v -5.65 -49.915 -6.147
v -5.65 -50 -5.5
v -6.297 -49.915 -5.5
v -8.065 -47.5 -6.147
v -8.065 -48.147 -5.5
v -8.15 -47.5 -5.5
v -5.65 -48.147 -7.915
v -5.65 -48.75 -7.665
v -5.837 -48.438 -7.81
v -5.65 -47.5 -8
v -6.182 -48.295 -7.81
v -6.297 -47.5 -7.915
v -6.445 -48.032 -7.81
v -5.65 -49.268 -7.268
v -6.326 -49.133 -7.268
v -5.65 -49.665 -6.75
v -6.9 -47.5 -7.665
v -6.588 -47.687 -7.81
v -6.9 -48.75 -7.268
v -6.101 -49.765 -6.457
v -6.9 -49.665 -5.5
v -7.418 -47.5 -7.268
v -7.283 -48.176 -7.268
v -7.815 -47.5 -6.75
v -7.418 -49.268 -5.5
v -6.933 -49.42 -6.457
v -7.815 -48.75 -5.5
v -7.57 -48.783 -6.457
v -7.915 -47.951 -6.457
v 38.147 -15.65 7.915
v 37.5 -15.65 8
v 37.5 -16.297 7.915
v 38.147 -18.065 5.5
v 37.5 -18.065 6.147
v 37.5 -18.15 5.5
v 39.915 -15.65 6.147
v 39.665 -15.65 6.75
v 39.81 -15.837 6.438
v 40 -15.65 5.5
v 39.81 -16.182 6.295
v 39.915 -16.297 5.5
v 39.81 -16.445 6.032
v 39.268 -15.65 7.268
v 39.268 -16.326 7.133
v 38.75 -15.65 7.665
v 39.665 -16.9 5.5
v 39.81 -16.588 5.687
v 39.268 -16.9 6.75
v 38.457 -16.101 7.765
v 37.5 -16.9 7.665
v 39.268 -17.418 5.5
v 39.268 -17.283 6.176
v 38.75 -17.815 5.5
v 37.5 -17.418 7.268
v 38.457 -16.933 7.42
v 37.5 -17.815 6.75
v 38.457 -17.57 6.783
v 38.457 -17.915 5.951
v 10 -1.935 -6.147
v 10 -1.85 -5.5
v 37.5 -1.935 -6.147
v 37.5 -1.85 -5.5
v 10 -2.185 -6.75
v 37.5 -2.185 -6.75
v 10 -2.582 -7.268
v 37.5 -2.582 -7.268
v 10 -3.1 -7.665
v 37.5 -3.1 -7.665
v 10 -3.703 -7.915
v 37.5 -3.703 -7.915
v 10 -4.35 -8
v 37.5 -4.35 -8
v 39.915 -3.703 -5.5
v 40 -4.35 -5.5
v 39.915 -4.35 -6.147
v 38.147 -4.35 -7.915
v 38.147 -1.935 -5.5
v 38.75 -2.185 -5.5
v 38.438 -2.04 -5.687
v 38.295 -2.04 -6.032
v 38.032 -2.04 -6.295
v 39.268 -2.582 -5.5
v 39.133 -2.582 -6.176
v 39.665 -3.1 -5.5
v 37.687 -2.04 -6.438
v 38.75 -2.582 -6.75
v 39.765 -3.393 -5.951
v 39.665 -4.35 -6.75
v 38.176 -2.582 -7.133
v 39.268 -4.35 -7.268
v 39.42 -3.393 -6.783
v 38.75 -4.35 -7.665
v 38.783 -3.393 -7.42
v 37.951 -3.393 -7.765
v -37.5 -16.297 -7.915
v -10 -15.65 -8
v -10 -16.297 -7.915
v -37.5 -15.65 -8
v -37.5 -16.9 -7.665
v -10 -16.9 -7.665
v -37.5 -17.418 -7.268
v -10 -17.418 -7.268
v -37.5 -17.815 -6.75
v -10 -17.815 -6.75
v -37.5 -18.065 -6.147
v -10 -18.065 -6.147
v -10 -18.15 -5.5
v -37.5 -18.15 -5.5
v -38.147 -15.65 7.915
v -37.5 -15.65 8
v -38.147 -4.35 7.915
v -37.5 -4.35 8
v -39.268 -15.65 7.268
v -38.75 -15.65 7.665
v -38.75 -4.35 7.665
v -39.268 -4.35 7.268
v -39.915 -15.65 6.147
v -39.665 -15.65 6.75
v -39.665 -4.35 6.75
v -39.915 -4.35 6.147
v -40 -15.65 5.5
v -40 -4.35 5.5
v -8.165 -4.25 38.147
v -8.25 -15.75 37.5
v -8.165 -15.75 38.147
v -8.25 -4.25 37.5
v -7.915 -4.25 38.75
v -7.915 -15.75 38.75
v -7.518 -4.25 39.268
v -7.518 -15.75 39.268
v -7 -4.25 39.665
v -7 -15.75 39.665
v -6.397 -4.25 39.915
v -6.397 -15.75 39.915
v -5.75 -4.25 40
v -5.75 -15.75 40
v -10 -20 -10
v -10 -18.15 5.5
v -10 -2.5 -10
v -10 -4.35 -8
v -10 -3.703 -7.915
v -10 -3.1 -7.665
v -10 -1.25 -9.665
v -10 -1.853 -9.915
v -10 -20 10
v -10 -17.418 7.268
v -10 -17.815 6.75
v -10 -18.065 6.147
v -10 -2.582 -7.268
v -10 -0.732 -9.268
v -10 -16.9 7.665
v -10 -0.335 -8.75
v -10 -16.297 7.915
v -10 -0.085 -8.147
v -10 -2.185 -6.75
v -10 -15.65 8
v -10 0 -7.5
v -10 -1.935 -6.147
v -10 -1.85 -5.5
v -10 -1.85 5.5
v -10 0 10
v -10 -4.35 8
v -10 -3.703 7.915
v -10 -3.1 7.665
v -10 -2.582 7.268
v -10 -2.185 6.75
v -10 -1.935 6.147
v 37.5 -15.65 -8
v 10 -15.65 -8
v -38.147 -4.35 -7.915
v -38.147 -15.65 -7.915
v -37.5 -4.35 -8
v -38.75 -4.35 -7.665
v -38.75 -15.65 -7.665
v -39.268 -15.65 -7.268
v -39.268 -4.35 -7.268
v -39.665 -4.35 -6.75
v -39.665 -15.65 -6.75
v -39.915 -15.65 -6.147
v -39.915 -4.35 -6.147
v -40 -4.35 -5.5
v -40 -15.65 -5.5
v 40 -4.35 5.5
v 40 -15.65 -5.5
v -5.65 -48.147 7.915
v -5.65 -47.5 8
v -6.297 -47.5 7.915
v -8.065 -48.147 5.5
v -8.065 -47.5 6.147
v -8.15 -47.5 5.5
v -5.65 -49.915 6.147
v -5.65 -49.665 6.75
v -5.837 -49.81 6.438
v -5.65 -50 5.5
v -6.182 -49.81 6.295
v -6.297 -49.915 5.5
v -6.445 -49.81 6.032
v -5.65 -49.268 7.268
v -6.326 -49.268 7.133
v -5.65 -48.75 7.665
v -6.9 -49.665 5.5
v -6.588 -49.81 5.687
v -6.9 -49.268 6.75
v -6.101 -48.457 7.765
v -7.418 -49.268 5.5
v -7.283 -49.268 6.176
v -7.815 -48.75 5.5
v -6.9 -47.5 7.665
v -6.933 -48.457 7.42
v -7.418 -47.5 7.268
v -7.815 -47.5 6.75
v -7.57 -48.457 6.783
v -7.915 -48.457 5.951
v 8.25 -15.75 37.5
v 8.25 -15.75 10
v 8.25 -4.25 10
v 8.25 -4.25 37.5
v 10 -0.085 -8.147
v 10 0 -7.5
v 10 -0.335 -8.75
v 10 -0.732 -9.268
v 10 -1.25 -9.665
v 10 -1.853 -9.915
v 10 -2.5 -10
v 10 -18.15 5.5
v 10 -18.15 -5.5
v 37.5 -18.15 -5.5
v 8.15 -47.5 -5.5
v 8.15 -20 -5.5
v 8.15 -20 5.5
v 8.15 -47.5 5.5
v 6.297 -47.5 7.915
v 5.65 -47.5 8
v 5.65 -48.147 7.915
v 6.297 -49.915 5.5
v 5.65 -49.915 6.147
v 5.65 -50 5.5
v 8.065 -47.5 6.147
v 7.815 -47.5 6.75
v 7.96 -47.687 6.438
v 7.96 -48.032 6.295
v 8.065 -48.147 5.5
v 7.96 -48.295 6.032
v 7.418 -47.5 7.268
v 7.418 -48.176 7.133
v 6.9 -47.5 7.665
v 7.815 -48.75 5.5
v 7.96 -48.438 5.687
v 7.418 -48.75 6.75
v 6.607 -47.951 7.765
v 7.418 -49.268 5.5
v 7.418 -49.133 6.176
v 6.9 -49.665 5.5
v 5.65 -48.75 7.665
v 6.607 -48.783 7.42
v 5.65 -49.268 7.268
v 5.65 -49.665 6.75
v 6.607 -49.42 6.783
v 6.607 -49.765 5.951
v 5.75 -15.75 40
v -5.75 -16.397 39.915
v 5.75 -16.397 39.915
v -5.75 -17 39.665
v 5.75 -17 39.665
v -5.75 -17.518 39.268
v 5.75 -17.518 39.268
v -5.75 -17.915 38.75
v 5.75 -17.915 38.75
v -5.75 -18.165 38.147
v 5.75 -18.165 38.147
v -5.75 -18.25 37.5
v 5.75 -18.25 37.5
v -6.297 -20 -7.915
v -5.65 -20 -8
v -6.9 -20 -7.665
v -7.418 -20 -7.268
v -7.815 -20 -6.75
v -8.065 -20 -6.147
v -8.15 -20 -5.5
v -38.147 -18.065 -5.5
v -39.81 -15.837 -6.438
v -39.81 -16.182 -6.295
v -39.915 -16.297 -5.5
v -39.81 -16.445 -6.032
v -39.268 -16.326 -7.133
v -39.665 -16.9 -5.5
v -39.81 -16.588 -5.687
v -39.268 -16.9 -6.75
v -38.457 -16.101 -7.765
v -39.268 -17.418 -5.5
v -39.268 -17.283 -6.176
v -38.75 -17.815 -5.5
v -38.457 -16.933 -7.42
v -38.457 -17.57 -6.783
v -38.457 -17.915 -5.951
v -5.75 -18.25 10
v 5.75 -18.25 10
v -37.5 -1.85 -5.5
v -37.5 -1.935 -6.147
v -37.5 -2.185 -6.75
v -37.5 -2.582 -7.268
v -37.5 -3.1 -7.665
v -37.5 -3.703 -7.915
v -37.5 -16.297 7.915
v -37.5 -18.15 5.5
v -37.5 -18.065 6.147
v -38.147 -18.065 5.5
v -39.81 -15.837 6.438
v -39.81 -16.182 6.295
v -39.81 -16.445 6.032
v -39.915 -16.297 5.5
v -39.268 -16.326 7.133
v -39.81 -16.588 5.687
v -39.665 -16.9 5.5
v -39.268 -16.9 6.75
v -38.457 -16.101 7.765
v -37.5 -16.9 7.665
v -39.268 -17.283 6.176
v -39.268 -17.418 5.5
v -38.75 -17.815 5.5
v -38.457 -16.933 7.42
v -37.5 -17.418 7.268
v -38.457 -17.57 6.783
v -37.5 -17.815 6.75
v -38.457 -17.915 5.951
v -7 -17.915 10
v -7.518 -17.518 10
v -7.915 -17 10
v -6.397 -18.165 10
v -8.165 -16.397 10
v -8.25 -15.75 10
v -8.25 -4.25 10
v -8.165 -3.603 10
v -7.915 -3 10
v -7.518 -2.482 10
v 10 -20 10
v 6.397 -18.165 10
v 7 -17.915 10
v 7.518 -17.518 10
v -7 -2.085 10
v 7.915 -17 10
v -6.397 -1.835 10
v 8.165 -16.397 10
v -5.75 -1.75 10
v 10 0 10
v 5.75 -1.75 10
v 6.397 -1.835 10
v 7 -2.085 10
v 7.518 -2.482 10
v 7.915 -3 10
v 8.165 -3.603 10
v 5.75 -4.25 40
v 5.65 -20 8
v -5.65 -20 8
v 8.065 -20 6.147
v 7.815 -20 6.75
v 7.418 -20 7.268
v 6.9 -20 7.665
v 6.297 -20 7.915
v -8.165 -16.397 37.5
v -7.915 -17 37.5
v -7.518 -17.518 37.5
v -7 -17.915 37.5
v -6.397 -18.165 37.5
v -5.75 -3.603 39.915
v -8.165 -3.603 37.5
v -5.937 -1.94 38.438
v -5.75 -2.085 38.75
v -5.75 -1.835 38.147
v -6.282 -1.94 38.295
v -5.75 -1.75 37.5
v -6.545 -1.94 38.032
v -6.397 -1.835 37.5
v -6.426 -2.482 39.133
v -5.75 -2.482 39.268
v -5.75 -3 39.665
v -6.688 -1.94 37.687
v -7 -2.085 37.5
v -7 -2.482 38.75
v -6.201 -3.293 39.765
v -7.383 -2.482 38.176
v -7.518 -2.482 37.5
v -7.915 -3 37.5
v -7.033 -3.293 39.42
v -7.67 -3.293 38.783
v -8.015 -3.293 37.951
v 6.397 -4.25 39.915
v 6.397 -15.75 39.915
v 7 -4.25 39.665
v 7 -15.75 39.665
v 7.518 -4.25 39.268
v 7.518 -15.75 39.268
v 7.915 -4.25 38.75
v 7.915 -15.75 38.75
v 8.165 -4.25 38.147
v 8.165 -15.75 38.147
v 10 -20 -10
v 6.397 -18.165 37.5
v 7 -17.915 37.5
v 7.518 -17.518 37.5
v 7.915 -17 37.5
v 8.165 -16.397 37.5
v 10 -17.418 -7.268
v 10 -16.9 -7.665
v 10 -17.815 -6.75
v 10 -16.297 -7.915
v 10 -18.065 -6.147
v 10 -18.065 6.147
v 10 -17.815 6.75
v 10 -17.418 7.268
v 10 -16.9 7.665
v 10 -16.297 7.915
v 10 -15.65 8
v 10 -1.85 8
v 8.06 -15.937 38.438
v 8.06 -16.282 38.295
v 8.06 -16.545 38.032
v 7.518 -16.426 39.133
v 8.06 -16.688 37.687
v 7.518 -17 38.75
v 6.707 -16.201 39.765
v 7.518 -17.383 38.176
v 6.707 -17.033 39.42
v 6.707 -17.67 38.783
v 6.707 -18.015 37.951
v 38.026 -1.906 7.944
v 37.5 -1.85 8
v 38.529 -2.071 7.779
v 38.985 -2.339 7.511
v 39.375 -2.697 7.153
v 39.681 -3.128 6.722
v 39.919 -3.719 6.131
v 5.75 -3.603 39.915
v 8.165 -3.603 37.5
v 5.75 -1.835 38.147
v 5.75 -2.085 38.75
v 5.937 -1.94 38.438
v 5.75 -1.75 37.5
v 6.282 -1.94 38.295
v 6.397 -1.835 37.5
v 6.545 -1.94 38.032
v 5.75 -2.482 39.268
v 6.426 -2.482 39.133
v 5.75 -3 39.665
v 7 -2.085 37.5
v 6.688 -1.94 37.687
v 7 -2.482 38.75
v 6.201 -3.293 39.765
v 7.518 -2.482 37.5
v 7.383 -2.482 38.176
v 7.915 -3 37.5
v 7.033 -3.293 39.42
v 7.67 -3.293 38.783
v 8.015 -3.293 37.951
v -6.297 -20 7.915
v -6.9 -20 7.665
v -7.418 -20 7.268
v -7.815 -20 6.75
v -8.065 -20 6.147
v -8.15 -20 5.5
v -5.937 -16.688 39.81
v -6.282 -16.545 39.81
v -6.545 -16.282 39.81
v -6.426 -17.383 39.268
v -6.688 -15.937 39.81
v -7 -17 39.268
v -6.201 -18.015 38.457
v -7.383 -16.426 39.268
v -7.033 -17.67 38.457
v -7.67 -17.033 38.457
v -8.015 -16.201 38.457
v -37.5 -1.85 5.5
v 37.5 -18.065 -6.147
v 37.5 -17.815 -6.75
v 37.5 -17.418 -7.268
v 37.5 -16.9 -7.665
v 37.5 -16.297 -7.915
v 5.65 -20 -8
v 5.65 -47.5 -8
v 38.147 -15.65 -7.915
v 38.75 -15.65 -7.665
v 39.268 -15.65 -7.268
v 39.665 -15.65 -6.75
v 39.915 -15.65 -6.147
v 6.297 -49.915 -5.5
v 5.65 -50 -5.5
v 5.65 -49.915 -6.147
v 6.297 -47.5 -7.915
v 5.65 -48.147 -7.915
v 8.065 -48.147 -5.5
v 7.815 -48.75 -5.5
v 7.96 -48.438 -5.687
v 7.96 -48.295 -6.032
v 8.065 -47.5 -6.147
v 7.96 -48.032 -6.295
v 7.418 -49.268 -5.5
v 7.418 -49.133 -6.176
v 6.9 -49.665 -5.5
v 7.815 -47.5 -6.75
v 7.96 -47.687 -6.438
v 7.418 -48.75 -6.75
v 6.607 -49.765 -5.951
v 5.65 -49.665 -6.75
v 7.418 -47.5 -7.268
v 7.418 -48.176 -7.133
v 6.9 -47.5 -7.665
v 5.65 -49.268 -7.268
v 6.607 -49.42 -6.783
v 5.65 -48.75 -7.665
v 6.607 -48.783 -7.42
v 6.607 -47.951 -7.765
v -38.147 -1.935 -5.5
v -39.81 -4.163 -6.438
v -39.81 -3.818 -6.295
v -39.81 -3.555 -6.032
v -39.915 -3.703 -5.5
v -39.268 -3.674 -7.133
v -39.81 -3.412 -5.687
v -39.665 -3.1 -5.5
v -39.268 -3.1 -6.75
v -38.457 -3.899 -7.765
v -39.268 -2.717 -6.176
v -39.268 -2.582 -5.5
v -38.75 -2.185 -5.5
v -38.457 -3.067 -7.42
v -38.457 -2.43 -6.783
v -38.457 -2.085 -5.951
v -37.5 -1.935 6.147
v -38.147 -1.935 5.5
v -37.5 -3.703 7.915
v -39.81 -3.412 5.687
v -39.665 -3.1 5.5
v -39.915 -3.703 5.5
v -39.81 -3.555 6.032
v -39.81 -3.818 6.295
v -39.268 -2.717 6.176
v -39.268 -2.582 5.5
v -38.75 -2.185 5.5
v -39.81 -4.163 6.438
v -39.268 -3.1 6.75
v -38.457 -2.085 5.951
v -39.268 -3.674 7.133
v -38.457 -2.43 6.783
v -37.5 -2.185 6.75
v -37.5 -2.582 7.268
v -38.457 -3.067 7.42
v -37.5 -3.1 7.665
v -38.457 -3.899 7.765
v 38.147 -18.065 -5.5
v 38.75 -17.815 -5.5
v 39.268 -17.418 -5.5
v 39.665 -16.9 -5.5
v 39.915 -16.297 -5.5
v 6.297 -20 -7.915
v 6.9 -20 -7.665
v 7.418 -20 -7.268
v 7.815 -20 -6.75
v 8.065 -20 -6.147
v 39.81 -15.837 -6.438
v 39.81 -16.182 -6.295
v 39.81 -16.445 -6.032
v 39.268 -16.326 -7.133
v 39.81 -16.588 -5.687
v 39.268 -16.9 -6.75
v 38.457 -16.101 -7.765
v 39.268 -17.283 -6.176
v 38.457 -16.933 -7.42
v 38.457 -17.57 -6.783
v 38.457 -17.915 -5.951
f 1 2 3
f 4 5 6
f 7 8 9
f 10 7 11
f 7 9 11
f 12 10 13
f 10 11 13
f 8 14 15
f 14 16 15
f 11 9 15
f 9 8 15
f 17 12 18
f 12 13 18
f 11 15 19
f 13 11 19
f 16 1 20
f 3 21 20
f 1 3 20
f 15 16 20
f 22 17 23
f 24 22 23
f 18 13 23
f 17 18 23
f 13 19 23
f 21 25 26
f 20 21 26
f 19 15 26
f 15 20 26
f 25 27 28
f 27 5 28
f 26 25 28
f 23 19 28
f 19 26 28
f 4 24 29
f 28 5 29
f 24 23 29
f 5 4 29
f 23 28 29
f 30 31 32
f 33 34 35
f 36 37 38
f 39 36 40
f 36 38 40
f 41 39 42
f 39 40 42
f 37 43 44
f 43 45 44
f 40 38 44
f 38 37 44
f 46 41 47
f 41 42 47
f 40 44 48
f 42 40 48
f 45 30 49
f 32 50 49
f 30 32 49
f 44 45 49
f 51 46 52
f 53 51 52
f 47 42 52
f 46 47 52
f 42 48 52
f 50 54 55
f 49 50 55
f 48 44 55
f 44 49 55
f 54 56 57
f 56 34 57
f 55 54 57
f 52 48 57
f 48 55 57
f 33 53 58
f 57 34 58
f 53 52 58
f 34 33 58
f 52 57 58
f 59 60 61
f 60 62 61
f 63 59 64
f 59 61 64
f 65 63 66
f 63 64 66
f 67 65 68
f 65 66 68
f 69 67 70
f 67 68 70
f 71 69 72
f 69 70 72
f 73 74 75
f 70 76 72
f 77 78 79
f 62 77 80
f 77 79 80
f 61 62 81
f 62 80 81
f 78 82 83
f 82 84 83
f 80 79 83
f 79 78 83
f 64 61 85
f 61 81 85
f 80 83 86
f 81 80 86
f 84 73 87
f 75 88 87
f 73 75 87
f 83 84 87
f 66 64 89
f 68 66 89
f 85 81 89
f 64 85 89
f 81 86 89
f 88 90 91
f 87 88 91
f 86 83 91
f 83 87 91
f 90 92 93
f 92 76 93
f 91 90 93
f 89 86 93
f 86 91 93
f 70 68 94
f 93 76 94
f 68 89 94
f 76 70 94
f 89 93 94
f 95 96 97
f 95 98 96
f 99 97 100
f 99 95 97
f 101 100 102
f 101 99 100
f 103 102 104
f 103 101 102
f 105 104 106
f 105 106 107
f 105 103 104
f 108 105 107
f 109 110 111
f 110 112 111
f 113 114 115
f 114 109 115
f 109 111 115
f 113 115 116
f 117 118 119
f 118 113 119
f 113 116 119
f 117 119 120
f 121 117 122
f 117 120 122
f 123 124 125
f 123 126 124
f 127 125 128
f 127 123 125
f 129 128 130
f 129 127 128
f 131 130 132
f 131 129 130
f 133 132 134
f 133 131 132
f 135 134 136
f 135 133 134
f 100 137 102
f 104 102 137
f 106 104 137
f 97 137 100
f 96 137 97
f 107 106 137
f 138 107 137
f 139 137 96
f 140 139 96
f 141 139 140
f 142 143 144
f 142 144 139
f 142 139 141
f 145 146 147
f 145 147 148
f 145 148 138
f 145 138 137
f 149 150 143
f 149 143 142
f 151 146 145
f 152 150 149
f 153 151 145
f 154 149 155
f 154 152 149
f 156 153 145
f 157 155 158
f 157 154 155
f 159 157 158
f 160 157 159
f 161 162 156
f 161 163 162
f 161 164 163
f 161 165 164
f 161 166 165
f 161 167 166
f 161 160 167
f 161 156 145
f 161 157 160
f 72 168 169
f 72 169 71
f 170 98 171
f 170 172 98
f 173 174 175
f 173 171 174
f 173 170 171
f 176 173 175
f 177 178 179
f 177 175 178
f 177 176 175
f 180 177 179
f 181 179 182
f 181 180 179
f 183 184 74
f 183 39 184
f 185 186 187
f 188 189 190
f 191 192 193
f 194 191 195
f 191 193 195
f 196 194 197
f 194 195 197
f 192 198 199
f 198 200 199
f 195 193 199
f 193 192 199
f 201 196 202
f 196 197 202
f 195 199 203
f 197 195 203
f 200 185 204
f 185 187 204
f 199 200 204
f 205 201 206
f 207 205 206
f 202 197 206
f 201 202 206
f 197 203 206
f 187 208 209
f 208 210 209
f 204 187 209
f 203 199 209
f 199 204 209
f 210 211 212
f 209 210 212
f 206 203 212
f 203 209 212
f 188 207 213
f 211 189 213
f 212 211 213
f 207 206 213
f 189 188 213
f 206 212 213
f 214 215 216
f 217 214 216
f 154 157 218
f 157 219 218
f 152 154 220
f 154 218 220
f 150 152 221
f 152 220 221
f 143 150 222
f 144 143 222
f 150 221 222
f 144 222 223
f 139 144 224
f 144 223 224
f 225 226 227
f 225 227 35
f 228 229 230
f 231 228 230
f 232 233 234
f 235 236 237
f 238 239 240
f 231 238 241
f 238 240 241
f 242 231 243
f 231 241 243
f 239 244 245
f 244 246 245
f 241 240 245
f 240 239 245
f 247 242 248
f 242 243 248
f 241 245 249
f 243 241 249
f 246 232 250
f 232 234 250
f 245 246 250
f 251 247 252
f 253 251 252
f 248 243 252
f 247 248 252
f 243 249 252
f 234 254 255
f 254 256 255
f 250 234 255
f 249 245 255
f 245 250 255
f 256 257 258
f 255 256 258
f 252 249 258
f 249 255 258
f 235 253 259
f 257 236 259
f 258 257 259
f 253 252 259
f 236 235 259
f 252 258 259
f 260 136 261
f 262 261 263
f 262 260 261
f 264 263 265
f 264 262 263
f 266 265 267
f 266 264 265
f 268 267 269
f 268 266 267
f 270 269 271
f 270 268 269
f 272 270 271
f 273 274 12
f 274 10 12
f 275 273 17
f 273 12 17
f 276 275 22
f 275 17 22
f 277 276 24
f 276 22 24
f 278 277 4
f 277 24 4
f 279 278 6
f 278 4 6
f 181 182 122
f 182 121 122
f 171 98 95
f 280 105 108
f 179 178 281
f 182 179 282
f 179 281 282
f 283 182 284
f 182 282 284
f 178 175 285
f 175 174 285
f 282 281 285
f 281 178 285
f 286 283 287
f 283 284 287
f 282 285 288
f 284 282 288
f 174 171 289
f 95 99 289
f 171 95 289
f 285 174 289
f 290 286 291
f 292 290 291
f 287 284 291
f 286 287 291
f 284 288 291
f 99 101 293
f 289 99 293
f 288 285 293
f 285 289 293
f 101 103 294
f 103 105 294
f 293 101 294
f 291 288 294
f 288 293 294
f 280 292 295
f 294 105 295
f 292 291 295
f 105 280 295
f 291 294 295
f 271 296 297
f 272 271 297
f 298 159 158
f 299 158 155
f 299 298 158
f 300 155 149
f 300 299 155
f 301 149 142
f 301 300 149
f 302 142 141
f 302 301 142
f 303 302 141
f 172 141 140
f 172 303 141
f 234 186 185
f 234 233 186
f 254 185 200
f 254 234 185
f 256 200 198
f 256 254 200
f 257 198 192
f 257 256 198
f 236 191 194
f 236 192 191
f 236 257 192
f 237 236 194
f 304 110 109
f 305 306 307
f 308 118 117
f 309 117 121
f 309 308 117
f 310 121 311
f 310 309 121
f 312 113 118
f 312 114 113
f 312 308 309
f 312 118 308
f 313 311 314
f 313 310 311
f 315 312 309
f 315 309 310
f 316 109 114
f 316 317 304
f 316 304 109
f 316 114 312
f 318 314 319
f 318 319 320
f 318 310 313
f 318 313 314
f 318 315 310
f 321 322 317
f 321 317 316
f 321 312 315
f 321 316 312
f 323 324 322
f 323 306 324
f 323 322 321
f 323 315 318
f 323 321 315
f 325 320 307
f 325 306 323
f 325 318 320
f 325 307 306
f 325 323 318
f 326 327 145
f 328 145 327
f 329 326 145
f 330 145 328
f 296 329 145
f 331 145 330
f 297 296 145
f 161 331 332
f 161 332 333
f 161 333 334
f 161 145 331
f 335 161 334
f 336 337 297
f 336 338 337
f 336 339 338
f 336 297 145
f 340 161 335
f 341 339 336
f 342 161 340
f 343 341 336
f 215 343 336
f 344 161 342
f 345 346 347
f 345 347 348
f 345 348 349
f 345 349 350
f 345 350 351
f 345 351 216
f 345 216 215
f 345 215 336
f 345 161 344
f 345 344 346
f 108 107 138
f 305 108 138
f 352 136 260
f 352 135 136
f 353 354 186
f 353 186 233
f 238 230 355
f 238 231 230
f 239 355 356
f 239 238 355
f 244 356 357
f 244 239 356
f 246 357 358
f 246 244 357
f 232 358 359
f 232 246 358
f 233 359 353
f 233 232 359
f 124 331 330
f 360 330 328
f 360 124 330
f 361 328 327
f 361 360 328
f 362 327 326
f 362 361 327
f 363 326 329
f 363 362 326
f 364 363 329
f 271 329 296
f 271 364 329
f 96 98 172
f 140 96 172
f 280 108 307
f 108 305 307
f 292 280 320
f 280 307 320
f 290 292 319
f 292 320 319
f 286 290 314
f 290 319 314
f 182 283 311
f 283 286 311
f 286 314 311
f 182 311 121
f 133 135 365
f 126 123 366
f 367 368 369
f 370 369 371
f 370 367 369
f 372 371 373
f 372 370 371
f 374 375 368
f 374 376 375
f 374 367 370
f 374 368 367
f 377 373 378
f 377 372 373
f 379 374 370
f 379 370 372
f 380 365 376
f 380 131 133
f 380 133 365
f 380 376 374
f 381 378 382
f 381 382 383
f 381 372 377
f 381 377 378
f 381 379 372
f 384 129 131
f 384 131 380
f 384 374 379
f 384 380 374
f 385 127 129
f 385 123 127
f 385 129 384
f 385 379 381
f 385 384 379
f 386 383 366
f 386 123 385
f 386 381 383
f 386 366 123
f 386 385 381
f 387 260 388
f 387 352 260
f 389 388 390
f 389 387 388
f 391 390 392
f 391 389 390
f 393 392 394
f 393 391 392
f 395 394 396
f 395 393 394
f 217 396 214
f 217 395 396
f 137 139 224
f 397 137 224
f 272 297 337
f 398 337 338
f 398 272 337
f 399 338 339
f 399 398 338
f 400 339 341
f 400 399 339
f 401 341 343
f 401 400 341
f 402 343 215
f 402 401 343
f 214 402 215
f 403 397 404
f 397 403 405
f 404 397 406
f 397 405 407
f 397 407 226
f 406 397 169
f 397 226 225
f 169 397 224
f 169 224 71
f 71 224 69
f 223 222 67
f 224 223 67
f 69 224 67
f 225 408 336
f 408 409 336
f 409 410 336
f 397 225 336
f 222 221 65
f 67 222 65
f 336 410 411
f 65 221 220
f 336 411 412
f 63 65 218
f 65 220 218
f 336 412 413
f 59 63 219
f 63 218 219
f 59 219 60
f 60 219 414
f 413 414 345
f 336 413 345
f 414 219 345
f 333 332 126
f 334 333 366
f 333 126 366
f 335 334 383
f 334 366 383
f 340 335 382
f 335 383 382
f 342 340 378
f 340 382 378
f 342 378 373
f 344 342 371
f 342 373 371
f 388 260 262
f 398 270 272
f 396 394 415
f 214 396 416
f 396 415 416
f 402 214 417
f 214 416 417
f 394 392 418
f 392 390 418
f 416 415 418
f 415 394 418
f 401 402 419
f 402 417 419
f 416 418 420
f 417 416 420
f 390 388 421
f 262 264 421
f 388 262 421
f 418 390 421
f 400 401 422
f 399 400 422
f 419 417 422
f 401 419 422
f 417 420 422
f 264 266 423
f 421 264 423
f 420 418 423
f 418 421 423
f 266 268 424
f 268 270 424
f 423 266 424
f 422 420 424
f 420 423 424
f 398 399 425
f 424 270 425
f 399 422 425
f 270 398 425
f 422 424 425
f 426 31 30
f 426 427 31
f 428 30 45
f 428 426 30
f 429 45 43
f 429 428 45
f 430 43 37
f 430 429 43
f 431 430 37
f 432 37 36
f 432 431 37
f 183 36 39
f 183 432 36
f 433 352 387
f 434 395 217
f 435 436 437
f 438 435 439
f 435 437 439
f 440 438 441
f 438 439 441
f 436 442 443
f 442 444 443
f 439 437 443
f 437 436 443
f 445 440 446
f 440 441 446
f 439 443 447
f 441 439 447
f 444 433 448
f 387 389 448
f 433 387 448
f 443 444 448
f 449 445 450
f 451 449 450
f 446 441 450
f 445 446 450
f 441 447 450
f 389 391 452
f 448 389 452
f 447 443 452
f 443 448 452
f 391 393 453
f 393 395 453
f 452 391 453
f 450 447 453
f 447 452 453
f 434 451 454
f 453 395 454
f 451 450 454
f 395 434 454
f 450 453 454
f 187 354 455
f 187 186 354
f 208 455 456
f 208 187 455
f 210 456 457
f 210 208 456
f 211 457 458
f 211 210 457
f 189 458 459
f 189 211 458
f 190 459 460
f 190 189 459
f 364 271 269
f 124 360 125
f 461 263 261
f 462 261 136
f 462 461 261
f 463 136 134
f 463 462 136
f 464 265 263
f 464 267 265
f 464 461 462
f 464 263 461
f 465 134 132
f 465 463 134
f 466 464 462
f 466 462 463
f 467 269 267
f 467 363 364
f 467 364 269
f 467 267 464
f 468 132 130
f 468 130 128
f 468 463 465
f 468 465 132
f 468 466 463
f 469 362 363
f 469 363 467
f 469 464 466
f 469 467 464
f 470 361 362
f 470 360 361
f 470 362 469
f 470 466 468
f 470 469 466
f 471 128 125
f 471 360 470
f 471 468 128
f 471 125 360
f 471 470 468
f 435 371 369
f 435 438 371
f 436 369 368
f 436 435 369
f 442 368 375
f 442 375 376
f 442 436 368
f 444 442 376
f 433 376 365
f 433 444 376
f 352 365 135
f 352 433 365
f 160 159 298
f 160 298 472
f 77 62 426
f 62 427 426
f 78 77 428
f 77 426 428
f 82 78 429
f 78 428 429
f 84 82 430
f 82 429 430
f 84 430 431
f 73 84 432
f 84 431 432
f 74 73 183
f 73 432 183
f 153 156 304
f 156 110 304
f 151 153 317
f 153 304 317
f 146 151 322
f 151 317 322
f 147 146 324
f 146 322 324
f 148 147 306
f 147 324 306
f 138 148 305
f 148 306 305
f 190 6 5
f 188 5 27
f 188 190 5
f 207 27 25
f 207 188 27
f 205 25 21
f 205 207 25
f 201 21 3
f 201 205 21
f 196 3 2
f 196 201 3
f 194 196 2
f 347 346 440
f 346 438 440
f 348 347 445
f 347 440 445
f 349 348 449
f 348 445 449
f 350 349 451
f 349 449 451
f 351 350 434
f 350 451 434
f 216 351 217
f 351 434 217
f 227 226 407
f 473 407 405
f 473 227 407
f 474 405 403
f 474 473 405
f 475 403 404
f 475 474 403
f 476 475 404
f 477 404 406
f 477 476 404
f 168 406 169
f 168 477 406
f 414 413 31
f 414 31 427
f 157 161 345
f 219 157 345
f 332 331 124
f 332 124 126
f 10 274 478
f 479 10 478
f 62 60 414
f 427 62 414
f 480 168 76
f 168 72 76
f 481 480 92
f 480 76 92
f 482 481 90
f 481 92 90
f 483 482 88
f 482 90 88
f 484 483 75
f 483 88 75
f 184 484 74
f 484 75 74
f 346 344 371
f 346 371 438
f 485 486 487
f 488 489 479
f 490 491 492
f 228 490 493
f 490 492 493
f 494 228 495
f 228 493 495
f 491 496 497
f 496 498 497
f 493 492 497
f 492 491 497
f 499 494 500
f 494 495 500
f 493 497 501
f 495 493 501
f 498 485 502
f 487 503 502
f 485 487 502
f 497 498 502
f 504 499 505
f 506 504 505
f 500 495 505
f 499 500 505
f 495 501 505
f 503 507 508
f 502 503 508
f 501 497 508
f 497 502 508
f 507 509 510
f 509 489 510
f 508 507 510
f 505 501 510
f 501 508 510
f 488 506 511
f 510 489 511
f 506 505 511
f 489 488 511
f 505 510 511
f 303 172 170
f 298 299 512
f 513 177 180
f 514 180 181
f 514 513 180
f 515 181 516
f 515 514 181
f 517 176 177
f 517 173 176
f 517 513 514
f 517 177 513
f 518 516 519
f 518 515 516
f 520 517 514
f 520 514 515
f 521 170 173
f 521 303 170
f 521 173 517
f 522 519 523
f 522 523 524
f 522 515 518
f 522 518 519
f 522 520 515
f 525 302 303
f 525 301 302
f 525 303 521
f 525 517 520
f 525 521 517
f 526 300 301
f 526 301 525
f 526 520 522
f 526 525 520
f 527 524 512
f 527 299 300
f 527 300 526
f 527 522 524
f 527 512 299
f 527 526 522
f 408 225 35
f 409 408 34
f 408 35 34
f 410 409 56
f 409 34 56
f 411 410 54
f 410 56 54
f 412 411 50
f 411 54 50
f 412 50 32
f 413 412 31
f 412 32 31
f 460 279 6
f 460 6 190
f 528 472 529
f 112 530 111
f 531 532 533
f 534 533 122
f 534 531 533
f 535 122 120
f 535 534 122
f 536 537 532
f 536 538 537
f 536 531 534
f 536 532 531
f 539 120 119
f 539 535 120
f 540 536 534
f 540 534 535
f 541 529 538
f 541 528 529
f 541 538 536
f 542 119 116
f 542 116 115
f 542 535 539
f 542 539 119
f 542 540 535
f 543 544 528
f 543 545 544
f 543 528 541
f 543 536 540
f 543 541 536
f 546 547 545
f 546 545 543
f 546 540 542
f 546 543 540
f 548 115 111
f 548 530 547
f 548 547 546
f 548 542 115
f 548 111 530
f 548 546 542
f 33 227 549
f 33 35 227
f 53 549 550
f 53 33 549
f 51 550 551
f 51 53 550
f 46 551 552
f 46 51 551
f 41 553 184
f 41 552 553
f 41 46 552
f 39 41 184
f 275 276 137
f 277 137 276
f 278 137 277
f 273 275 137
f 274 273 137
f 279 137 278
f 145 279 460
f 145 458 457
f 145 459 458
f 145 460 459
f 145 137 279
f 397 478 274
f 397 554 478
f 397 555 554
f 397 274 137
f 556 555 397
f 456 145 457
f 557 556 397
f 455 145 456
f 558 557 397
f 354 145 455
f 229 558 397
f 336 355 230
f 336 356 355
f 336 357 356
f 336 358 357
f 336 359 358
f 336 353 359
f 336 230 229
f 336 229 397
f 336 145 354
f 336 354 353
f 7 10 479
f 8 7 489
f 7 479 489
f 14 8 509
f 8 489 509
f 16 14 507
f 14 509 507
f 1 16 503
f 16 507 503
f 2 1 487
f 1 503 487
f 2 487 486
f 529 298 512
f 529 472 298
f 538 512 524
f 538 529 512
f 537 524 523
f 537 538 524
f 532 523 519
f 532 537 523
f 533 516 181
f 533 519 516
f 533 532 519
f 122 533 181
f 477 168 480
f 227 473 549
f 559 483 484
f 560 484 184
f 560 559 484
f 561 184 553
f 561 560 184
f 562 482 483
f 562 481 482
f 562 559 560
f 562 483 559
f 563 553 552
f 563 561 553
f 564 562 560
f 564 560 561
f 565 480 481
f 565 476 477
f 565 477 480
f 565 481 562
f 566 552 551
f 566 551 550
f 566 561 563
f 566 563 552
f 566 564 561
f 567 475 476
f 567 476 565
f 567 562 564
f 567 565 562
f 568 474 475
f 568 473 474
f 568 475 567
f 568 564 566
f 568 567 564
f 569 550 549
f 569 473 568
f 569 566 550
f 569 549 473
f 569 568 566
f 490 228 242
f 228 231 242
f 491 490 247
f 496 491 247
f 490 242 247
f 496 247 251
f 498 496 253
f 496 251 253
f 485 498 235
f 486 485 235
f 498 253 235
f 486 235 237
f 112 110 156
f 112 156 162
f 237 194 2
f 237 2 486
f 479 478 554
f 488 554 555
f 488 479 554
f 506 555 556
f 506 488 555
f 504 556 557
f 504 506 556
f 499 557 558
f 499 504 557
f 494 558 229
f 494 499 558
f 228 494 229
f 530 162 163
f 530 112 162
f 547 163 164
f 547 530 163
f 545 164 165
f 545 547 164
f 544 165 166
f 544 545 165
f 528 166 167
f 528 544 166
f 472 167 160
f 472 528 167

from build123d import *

# Parameters (mm, degrees)
F0_W     = 16.3
F0_H     = 16
F1_DEPTH = 50
F0_W_2   = 20
F0_H_2   = 20
F2_DEPTH = 20
F3_W     = 16.3
F3_H     = 16
F4_DEPTH = 40
F5_W     = 16.3
F5_H     = 16
F6_DEPTH = 40
F7_W     = 16.5
F7_H     = 16.5
F8_DEPTH = 40
F9_R     = 2.5


with BuildPart() as f1:
    # F0 (on Front) → F1 (new body)
    with BuildSketch(Plane.XZ):
        Rectangle(F0_W, F0_H)
    extrude(amount=F1_DEPTH)

    # F0 (on Front) → F2 (join)
    with BuildSketch(Plane.XZ):
        Rectangle(F0_W_2, F0_H_2)
        Rectangle(F0_W, F0_H, mode=Mode.SUBTRACT)
    extrude(amount=F2_DEPTH)

    # F3 (on Right) → F4 (join)
    with BuildSketch(Plane.YZ):
        with Locations((-10, 0)):
            Rectangle(F3_W, F3_H)
    extrude(amount=F4_DEPTH)

    # F5 (on Right) → F6 (join)
    with BuildSketch(Plane.YZ):
        with Locations((-10, 0)):
            Rectangle(F5_W, F5_H)
    extrude(amount=-F6_DEPTH)

    # F7 (on Top) → F8 (join)
    with BuildSketch(Plane.XY):
        with Locations((0, -10)):
            Rectangle(F7_W, F7_H)
    extrude(amount=F8_DEPTH)

    # F9
    f9_edges = [f1.edges().sort_by_distance(p)[0] for p in [
        (0, 0, -10),
        (-25, -1.85, -8),
        (-25, -18.15, -8),
        (-25, -1.85, 8),
        (-25, -18.15, 8),
        (-40, -10, -8),
        (-40, -1.85, 0),
        (-40, -10, 8),
        (-40, -18.15, 0),
        (-8.25, -18.25, 25),
        (0, -18.25, 40),
        (-8.25, -10, 40),
        (8.25, -10, 40),
        (0, -1.75, 40),
        (-8.25, -1.75, 25),
        (8.25, -1.75, 25),
        (8.25, -18.25, 25),
        (-8.15, -35, 8),
        (0, -50, 8),
        (8.15, -35, 8),
        (-8.15, -50, 0),
        (0, -50, -8),
        (8.15, -50, 0),
        (25, -18.15, 8),
        (25, -18.15, -8),
        (40, -10, -8),
        (40, -1.85, 0),
        (40, -10, 8),
        (40, -18.15, 0),
        (8.15, -35, -8),
        (-8.15, -35, -8),
        (25, -1.85, -8),
    ]]
    fillet(f9_edges, radius=F9_R)


solid = f1.part
